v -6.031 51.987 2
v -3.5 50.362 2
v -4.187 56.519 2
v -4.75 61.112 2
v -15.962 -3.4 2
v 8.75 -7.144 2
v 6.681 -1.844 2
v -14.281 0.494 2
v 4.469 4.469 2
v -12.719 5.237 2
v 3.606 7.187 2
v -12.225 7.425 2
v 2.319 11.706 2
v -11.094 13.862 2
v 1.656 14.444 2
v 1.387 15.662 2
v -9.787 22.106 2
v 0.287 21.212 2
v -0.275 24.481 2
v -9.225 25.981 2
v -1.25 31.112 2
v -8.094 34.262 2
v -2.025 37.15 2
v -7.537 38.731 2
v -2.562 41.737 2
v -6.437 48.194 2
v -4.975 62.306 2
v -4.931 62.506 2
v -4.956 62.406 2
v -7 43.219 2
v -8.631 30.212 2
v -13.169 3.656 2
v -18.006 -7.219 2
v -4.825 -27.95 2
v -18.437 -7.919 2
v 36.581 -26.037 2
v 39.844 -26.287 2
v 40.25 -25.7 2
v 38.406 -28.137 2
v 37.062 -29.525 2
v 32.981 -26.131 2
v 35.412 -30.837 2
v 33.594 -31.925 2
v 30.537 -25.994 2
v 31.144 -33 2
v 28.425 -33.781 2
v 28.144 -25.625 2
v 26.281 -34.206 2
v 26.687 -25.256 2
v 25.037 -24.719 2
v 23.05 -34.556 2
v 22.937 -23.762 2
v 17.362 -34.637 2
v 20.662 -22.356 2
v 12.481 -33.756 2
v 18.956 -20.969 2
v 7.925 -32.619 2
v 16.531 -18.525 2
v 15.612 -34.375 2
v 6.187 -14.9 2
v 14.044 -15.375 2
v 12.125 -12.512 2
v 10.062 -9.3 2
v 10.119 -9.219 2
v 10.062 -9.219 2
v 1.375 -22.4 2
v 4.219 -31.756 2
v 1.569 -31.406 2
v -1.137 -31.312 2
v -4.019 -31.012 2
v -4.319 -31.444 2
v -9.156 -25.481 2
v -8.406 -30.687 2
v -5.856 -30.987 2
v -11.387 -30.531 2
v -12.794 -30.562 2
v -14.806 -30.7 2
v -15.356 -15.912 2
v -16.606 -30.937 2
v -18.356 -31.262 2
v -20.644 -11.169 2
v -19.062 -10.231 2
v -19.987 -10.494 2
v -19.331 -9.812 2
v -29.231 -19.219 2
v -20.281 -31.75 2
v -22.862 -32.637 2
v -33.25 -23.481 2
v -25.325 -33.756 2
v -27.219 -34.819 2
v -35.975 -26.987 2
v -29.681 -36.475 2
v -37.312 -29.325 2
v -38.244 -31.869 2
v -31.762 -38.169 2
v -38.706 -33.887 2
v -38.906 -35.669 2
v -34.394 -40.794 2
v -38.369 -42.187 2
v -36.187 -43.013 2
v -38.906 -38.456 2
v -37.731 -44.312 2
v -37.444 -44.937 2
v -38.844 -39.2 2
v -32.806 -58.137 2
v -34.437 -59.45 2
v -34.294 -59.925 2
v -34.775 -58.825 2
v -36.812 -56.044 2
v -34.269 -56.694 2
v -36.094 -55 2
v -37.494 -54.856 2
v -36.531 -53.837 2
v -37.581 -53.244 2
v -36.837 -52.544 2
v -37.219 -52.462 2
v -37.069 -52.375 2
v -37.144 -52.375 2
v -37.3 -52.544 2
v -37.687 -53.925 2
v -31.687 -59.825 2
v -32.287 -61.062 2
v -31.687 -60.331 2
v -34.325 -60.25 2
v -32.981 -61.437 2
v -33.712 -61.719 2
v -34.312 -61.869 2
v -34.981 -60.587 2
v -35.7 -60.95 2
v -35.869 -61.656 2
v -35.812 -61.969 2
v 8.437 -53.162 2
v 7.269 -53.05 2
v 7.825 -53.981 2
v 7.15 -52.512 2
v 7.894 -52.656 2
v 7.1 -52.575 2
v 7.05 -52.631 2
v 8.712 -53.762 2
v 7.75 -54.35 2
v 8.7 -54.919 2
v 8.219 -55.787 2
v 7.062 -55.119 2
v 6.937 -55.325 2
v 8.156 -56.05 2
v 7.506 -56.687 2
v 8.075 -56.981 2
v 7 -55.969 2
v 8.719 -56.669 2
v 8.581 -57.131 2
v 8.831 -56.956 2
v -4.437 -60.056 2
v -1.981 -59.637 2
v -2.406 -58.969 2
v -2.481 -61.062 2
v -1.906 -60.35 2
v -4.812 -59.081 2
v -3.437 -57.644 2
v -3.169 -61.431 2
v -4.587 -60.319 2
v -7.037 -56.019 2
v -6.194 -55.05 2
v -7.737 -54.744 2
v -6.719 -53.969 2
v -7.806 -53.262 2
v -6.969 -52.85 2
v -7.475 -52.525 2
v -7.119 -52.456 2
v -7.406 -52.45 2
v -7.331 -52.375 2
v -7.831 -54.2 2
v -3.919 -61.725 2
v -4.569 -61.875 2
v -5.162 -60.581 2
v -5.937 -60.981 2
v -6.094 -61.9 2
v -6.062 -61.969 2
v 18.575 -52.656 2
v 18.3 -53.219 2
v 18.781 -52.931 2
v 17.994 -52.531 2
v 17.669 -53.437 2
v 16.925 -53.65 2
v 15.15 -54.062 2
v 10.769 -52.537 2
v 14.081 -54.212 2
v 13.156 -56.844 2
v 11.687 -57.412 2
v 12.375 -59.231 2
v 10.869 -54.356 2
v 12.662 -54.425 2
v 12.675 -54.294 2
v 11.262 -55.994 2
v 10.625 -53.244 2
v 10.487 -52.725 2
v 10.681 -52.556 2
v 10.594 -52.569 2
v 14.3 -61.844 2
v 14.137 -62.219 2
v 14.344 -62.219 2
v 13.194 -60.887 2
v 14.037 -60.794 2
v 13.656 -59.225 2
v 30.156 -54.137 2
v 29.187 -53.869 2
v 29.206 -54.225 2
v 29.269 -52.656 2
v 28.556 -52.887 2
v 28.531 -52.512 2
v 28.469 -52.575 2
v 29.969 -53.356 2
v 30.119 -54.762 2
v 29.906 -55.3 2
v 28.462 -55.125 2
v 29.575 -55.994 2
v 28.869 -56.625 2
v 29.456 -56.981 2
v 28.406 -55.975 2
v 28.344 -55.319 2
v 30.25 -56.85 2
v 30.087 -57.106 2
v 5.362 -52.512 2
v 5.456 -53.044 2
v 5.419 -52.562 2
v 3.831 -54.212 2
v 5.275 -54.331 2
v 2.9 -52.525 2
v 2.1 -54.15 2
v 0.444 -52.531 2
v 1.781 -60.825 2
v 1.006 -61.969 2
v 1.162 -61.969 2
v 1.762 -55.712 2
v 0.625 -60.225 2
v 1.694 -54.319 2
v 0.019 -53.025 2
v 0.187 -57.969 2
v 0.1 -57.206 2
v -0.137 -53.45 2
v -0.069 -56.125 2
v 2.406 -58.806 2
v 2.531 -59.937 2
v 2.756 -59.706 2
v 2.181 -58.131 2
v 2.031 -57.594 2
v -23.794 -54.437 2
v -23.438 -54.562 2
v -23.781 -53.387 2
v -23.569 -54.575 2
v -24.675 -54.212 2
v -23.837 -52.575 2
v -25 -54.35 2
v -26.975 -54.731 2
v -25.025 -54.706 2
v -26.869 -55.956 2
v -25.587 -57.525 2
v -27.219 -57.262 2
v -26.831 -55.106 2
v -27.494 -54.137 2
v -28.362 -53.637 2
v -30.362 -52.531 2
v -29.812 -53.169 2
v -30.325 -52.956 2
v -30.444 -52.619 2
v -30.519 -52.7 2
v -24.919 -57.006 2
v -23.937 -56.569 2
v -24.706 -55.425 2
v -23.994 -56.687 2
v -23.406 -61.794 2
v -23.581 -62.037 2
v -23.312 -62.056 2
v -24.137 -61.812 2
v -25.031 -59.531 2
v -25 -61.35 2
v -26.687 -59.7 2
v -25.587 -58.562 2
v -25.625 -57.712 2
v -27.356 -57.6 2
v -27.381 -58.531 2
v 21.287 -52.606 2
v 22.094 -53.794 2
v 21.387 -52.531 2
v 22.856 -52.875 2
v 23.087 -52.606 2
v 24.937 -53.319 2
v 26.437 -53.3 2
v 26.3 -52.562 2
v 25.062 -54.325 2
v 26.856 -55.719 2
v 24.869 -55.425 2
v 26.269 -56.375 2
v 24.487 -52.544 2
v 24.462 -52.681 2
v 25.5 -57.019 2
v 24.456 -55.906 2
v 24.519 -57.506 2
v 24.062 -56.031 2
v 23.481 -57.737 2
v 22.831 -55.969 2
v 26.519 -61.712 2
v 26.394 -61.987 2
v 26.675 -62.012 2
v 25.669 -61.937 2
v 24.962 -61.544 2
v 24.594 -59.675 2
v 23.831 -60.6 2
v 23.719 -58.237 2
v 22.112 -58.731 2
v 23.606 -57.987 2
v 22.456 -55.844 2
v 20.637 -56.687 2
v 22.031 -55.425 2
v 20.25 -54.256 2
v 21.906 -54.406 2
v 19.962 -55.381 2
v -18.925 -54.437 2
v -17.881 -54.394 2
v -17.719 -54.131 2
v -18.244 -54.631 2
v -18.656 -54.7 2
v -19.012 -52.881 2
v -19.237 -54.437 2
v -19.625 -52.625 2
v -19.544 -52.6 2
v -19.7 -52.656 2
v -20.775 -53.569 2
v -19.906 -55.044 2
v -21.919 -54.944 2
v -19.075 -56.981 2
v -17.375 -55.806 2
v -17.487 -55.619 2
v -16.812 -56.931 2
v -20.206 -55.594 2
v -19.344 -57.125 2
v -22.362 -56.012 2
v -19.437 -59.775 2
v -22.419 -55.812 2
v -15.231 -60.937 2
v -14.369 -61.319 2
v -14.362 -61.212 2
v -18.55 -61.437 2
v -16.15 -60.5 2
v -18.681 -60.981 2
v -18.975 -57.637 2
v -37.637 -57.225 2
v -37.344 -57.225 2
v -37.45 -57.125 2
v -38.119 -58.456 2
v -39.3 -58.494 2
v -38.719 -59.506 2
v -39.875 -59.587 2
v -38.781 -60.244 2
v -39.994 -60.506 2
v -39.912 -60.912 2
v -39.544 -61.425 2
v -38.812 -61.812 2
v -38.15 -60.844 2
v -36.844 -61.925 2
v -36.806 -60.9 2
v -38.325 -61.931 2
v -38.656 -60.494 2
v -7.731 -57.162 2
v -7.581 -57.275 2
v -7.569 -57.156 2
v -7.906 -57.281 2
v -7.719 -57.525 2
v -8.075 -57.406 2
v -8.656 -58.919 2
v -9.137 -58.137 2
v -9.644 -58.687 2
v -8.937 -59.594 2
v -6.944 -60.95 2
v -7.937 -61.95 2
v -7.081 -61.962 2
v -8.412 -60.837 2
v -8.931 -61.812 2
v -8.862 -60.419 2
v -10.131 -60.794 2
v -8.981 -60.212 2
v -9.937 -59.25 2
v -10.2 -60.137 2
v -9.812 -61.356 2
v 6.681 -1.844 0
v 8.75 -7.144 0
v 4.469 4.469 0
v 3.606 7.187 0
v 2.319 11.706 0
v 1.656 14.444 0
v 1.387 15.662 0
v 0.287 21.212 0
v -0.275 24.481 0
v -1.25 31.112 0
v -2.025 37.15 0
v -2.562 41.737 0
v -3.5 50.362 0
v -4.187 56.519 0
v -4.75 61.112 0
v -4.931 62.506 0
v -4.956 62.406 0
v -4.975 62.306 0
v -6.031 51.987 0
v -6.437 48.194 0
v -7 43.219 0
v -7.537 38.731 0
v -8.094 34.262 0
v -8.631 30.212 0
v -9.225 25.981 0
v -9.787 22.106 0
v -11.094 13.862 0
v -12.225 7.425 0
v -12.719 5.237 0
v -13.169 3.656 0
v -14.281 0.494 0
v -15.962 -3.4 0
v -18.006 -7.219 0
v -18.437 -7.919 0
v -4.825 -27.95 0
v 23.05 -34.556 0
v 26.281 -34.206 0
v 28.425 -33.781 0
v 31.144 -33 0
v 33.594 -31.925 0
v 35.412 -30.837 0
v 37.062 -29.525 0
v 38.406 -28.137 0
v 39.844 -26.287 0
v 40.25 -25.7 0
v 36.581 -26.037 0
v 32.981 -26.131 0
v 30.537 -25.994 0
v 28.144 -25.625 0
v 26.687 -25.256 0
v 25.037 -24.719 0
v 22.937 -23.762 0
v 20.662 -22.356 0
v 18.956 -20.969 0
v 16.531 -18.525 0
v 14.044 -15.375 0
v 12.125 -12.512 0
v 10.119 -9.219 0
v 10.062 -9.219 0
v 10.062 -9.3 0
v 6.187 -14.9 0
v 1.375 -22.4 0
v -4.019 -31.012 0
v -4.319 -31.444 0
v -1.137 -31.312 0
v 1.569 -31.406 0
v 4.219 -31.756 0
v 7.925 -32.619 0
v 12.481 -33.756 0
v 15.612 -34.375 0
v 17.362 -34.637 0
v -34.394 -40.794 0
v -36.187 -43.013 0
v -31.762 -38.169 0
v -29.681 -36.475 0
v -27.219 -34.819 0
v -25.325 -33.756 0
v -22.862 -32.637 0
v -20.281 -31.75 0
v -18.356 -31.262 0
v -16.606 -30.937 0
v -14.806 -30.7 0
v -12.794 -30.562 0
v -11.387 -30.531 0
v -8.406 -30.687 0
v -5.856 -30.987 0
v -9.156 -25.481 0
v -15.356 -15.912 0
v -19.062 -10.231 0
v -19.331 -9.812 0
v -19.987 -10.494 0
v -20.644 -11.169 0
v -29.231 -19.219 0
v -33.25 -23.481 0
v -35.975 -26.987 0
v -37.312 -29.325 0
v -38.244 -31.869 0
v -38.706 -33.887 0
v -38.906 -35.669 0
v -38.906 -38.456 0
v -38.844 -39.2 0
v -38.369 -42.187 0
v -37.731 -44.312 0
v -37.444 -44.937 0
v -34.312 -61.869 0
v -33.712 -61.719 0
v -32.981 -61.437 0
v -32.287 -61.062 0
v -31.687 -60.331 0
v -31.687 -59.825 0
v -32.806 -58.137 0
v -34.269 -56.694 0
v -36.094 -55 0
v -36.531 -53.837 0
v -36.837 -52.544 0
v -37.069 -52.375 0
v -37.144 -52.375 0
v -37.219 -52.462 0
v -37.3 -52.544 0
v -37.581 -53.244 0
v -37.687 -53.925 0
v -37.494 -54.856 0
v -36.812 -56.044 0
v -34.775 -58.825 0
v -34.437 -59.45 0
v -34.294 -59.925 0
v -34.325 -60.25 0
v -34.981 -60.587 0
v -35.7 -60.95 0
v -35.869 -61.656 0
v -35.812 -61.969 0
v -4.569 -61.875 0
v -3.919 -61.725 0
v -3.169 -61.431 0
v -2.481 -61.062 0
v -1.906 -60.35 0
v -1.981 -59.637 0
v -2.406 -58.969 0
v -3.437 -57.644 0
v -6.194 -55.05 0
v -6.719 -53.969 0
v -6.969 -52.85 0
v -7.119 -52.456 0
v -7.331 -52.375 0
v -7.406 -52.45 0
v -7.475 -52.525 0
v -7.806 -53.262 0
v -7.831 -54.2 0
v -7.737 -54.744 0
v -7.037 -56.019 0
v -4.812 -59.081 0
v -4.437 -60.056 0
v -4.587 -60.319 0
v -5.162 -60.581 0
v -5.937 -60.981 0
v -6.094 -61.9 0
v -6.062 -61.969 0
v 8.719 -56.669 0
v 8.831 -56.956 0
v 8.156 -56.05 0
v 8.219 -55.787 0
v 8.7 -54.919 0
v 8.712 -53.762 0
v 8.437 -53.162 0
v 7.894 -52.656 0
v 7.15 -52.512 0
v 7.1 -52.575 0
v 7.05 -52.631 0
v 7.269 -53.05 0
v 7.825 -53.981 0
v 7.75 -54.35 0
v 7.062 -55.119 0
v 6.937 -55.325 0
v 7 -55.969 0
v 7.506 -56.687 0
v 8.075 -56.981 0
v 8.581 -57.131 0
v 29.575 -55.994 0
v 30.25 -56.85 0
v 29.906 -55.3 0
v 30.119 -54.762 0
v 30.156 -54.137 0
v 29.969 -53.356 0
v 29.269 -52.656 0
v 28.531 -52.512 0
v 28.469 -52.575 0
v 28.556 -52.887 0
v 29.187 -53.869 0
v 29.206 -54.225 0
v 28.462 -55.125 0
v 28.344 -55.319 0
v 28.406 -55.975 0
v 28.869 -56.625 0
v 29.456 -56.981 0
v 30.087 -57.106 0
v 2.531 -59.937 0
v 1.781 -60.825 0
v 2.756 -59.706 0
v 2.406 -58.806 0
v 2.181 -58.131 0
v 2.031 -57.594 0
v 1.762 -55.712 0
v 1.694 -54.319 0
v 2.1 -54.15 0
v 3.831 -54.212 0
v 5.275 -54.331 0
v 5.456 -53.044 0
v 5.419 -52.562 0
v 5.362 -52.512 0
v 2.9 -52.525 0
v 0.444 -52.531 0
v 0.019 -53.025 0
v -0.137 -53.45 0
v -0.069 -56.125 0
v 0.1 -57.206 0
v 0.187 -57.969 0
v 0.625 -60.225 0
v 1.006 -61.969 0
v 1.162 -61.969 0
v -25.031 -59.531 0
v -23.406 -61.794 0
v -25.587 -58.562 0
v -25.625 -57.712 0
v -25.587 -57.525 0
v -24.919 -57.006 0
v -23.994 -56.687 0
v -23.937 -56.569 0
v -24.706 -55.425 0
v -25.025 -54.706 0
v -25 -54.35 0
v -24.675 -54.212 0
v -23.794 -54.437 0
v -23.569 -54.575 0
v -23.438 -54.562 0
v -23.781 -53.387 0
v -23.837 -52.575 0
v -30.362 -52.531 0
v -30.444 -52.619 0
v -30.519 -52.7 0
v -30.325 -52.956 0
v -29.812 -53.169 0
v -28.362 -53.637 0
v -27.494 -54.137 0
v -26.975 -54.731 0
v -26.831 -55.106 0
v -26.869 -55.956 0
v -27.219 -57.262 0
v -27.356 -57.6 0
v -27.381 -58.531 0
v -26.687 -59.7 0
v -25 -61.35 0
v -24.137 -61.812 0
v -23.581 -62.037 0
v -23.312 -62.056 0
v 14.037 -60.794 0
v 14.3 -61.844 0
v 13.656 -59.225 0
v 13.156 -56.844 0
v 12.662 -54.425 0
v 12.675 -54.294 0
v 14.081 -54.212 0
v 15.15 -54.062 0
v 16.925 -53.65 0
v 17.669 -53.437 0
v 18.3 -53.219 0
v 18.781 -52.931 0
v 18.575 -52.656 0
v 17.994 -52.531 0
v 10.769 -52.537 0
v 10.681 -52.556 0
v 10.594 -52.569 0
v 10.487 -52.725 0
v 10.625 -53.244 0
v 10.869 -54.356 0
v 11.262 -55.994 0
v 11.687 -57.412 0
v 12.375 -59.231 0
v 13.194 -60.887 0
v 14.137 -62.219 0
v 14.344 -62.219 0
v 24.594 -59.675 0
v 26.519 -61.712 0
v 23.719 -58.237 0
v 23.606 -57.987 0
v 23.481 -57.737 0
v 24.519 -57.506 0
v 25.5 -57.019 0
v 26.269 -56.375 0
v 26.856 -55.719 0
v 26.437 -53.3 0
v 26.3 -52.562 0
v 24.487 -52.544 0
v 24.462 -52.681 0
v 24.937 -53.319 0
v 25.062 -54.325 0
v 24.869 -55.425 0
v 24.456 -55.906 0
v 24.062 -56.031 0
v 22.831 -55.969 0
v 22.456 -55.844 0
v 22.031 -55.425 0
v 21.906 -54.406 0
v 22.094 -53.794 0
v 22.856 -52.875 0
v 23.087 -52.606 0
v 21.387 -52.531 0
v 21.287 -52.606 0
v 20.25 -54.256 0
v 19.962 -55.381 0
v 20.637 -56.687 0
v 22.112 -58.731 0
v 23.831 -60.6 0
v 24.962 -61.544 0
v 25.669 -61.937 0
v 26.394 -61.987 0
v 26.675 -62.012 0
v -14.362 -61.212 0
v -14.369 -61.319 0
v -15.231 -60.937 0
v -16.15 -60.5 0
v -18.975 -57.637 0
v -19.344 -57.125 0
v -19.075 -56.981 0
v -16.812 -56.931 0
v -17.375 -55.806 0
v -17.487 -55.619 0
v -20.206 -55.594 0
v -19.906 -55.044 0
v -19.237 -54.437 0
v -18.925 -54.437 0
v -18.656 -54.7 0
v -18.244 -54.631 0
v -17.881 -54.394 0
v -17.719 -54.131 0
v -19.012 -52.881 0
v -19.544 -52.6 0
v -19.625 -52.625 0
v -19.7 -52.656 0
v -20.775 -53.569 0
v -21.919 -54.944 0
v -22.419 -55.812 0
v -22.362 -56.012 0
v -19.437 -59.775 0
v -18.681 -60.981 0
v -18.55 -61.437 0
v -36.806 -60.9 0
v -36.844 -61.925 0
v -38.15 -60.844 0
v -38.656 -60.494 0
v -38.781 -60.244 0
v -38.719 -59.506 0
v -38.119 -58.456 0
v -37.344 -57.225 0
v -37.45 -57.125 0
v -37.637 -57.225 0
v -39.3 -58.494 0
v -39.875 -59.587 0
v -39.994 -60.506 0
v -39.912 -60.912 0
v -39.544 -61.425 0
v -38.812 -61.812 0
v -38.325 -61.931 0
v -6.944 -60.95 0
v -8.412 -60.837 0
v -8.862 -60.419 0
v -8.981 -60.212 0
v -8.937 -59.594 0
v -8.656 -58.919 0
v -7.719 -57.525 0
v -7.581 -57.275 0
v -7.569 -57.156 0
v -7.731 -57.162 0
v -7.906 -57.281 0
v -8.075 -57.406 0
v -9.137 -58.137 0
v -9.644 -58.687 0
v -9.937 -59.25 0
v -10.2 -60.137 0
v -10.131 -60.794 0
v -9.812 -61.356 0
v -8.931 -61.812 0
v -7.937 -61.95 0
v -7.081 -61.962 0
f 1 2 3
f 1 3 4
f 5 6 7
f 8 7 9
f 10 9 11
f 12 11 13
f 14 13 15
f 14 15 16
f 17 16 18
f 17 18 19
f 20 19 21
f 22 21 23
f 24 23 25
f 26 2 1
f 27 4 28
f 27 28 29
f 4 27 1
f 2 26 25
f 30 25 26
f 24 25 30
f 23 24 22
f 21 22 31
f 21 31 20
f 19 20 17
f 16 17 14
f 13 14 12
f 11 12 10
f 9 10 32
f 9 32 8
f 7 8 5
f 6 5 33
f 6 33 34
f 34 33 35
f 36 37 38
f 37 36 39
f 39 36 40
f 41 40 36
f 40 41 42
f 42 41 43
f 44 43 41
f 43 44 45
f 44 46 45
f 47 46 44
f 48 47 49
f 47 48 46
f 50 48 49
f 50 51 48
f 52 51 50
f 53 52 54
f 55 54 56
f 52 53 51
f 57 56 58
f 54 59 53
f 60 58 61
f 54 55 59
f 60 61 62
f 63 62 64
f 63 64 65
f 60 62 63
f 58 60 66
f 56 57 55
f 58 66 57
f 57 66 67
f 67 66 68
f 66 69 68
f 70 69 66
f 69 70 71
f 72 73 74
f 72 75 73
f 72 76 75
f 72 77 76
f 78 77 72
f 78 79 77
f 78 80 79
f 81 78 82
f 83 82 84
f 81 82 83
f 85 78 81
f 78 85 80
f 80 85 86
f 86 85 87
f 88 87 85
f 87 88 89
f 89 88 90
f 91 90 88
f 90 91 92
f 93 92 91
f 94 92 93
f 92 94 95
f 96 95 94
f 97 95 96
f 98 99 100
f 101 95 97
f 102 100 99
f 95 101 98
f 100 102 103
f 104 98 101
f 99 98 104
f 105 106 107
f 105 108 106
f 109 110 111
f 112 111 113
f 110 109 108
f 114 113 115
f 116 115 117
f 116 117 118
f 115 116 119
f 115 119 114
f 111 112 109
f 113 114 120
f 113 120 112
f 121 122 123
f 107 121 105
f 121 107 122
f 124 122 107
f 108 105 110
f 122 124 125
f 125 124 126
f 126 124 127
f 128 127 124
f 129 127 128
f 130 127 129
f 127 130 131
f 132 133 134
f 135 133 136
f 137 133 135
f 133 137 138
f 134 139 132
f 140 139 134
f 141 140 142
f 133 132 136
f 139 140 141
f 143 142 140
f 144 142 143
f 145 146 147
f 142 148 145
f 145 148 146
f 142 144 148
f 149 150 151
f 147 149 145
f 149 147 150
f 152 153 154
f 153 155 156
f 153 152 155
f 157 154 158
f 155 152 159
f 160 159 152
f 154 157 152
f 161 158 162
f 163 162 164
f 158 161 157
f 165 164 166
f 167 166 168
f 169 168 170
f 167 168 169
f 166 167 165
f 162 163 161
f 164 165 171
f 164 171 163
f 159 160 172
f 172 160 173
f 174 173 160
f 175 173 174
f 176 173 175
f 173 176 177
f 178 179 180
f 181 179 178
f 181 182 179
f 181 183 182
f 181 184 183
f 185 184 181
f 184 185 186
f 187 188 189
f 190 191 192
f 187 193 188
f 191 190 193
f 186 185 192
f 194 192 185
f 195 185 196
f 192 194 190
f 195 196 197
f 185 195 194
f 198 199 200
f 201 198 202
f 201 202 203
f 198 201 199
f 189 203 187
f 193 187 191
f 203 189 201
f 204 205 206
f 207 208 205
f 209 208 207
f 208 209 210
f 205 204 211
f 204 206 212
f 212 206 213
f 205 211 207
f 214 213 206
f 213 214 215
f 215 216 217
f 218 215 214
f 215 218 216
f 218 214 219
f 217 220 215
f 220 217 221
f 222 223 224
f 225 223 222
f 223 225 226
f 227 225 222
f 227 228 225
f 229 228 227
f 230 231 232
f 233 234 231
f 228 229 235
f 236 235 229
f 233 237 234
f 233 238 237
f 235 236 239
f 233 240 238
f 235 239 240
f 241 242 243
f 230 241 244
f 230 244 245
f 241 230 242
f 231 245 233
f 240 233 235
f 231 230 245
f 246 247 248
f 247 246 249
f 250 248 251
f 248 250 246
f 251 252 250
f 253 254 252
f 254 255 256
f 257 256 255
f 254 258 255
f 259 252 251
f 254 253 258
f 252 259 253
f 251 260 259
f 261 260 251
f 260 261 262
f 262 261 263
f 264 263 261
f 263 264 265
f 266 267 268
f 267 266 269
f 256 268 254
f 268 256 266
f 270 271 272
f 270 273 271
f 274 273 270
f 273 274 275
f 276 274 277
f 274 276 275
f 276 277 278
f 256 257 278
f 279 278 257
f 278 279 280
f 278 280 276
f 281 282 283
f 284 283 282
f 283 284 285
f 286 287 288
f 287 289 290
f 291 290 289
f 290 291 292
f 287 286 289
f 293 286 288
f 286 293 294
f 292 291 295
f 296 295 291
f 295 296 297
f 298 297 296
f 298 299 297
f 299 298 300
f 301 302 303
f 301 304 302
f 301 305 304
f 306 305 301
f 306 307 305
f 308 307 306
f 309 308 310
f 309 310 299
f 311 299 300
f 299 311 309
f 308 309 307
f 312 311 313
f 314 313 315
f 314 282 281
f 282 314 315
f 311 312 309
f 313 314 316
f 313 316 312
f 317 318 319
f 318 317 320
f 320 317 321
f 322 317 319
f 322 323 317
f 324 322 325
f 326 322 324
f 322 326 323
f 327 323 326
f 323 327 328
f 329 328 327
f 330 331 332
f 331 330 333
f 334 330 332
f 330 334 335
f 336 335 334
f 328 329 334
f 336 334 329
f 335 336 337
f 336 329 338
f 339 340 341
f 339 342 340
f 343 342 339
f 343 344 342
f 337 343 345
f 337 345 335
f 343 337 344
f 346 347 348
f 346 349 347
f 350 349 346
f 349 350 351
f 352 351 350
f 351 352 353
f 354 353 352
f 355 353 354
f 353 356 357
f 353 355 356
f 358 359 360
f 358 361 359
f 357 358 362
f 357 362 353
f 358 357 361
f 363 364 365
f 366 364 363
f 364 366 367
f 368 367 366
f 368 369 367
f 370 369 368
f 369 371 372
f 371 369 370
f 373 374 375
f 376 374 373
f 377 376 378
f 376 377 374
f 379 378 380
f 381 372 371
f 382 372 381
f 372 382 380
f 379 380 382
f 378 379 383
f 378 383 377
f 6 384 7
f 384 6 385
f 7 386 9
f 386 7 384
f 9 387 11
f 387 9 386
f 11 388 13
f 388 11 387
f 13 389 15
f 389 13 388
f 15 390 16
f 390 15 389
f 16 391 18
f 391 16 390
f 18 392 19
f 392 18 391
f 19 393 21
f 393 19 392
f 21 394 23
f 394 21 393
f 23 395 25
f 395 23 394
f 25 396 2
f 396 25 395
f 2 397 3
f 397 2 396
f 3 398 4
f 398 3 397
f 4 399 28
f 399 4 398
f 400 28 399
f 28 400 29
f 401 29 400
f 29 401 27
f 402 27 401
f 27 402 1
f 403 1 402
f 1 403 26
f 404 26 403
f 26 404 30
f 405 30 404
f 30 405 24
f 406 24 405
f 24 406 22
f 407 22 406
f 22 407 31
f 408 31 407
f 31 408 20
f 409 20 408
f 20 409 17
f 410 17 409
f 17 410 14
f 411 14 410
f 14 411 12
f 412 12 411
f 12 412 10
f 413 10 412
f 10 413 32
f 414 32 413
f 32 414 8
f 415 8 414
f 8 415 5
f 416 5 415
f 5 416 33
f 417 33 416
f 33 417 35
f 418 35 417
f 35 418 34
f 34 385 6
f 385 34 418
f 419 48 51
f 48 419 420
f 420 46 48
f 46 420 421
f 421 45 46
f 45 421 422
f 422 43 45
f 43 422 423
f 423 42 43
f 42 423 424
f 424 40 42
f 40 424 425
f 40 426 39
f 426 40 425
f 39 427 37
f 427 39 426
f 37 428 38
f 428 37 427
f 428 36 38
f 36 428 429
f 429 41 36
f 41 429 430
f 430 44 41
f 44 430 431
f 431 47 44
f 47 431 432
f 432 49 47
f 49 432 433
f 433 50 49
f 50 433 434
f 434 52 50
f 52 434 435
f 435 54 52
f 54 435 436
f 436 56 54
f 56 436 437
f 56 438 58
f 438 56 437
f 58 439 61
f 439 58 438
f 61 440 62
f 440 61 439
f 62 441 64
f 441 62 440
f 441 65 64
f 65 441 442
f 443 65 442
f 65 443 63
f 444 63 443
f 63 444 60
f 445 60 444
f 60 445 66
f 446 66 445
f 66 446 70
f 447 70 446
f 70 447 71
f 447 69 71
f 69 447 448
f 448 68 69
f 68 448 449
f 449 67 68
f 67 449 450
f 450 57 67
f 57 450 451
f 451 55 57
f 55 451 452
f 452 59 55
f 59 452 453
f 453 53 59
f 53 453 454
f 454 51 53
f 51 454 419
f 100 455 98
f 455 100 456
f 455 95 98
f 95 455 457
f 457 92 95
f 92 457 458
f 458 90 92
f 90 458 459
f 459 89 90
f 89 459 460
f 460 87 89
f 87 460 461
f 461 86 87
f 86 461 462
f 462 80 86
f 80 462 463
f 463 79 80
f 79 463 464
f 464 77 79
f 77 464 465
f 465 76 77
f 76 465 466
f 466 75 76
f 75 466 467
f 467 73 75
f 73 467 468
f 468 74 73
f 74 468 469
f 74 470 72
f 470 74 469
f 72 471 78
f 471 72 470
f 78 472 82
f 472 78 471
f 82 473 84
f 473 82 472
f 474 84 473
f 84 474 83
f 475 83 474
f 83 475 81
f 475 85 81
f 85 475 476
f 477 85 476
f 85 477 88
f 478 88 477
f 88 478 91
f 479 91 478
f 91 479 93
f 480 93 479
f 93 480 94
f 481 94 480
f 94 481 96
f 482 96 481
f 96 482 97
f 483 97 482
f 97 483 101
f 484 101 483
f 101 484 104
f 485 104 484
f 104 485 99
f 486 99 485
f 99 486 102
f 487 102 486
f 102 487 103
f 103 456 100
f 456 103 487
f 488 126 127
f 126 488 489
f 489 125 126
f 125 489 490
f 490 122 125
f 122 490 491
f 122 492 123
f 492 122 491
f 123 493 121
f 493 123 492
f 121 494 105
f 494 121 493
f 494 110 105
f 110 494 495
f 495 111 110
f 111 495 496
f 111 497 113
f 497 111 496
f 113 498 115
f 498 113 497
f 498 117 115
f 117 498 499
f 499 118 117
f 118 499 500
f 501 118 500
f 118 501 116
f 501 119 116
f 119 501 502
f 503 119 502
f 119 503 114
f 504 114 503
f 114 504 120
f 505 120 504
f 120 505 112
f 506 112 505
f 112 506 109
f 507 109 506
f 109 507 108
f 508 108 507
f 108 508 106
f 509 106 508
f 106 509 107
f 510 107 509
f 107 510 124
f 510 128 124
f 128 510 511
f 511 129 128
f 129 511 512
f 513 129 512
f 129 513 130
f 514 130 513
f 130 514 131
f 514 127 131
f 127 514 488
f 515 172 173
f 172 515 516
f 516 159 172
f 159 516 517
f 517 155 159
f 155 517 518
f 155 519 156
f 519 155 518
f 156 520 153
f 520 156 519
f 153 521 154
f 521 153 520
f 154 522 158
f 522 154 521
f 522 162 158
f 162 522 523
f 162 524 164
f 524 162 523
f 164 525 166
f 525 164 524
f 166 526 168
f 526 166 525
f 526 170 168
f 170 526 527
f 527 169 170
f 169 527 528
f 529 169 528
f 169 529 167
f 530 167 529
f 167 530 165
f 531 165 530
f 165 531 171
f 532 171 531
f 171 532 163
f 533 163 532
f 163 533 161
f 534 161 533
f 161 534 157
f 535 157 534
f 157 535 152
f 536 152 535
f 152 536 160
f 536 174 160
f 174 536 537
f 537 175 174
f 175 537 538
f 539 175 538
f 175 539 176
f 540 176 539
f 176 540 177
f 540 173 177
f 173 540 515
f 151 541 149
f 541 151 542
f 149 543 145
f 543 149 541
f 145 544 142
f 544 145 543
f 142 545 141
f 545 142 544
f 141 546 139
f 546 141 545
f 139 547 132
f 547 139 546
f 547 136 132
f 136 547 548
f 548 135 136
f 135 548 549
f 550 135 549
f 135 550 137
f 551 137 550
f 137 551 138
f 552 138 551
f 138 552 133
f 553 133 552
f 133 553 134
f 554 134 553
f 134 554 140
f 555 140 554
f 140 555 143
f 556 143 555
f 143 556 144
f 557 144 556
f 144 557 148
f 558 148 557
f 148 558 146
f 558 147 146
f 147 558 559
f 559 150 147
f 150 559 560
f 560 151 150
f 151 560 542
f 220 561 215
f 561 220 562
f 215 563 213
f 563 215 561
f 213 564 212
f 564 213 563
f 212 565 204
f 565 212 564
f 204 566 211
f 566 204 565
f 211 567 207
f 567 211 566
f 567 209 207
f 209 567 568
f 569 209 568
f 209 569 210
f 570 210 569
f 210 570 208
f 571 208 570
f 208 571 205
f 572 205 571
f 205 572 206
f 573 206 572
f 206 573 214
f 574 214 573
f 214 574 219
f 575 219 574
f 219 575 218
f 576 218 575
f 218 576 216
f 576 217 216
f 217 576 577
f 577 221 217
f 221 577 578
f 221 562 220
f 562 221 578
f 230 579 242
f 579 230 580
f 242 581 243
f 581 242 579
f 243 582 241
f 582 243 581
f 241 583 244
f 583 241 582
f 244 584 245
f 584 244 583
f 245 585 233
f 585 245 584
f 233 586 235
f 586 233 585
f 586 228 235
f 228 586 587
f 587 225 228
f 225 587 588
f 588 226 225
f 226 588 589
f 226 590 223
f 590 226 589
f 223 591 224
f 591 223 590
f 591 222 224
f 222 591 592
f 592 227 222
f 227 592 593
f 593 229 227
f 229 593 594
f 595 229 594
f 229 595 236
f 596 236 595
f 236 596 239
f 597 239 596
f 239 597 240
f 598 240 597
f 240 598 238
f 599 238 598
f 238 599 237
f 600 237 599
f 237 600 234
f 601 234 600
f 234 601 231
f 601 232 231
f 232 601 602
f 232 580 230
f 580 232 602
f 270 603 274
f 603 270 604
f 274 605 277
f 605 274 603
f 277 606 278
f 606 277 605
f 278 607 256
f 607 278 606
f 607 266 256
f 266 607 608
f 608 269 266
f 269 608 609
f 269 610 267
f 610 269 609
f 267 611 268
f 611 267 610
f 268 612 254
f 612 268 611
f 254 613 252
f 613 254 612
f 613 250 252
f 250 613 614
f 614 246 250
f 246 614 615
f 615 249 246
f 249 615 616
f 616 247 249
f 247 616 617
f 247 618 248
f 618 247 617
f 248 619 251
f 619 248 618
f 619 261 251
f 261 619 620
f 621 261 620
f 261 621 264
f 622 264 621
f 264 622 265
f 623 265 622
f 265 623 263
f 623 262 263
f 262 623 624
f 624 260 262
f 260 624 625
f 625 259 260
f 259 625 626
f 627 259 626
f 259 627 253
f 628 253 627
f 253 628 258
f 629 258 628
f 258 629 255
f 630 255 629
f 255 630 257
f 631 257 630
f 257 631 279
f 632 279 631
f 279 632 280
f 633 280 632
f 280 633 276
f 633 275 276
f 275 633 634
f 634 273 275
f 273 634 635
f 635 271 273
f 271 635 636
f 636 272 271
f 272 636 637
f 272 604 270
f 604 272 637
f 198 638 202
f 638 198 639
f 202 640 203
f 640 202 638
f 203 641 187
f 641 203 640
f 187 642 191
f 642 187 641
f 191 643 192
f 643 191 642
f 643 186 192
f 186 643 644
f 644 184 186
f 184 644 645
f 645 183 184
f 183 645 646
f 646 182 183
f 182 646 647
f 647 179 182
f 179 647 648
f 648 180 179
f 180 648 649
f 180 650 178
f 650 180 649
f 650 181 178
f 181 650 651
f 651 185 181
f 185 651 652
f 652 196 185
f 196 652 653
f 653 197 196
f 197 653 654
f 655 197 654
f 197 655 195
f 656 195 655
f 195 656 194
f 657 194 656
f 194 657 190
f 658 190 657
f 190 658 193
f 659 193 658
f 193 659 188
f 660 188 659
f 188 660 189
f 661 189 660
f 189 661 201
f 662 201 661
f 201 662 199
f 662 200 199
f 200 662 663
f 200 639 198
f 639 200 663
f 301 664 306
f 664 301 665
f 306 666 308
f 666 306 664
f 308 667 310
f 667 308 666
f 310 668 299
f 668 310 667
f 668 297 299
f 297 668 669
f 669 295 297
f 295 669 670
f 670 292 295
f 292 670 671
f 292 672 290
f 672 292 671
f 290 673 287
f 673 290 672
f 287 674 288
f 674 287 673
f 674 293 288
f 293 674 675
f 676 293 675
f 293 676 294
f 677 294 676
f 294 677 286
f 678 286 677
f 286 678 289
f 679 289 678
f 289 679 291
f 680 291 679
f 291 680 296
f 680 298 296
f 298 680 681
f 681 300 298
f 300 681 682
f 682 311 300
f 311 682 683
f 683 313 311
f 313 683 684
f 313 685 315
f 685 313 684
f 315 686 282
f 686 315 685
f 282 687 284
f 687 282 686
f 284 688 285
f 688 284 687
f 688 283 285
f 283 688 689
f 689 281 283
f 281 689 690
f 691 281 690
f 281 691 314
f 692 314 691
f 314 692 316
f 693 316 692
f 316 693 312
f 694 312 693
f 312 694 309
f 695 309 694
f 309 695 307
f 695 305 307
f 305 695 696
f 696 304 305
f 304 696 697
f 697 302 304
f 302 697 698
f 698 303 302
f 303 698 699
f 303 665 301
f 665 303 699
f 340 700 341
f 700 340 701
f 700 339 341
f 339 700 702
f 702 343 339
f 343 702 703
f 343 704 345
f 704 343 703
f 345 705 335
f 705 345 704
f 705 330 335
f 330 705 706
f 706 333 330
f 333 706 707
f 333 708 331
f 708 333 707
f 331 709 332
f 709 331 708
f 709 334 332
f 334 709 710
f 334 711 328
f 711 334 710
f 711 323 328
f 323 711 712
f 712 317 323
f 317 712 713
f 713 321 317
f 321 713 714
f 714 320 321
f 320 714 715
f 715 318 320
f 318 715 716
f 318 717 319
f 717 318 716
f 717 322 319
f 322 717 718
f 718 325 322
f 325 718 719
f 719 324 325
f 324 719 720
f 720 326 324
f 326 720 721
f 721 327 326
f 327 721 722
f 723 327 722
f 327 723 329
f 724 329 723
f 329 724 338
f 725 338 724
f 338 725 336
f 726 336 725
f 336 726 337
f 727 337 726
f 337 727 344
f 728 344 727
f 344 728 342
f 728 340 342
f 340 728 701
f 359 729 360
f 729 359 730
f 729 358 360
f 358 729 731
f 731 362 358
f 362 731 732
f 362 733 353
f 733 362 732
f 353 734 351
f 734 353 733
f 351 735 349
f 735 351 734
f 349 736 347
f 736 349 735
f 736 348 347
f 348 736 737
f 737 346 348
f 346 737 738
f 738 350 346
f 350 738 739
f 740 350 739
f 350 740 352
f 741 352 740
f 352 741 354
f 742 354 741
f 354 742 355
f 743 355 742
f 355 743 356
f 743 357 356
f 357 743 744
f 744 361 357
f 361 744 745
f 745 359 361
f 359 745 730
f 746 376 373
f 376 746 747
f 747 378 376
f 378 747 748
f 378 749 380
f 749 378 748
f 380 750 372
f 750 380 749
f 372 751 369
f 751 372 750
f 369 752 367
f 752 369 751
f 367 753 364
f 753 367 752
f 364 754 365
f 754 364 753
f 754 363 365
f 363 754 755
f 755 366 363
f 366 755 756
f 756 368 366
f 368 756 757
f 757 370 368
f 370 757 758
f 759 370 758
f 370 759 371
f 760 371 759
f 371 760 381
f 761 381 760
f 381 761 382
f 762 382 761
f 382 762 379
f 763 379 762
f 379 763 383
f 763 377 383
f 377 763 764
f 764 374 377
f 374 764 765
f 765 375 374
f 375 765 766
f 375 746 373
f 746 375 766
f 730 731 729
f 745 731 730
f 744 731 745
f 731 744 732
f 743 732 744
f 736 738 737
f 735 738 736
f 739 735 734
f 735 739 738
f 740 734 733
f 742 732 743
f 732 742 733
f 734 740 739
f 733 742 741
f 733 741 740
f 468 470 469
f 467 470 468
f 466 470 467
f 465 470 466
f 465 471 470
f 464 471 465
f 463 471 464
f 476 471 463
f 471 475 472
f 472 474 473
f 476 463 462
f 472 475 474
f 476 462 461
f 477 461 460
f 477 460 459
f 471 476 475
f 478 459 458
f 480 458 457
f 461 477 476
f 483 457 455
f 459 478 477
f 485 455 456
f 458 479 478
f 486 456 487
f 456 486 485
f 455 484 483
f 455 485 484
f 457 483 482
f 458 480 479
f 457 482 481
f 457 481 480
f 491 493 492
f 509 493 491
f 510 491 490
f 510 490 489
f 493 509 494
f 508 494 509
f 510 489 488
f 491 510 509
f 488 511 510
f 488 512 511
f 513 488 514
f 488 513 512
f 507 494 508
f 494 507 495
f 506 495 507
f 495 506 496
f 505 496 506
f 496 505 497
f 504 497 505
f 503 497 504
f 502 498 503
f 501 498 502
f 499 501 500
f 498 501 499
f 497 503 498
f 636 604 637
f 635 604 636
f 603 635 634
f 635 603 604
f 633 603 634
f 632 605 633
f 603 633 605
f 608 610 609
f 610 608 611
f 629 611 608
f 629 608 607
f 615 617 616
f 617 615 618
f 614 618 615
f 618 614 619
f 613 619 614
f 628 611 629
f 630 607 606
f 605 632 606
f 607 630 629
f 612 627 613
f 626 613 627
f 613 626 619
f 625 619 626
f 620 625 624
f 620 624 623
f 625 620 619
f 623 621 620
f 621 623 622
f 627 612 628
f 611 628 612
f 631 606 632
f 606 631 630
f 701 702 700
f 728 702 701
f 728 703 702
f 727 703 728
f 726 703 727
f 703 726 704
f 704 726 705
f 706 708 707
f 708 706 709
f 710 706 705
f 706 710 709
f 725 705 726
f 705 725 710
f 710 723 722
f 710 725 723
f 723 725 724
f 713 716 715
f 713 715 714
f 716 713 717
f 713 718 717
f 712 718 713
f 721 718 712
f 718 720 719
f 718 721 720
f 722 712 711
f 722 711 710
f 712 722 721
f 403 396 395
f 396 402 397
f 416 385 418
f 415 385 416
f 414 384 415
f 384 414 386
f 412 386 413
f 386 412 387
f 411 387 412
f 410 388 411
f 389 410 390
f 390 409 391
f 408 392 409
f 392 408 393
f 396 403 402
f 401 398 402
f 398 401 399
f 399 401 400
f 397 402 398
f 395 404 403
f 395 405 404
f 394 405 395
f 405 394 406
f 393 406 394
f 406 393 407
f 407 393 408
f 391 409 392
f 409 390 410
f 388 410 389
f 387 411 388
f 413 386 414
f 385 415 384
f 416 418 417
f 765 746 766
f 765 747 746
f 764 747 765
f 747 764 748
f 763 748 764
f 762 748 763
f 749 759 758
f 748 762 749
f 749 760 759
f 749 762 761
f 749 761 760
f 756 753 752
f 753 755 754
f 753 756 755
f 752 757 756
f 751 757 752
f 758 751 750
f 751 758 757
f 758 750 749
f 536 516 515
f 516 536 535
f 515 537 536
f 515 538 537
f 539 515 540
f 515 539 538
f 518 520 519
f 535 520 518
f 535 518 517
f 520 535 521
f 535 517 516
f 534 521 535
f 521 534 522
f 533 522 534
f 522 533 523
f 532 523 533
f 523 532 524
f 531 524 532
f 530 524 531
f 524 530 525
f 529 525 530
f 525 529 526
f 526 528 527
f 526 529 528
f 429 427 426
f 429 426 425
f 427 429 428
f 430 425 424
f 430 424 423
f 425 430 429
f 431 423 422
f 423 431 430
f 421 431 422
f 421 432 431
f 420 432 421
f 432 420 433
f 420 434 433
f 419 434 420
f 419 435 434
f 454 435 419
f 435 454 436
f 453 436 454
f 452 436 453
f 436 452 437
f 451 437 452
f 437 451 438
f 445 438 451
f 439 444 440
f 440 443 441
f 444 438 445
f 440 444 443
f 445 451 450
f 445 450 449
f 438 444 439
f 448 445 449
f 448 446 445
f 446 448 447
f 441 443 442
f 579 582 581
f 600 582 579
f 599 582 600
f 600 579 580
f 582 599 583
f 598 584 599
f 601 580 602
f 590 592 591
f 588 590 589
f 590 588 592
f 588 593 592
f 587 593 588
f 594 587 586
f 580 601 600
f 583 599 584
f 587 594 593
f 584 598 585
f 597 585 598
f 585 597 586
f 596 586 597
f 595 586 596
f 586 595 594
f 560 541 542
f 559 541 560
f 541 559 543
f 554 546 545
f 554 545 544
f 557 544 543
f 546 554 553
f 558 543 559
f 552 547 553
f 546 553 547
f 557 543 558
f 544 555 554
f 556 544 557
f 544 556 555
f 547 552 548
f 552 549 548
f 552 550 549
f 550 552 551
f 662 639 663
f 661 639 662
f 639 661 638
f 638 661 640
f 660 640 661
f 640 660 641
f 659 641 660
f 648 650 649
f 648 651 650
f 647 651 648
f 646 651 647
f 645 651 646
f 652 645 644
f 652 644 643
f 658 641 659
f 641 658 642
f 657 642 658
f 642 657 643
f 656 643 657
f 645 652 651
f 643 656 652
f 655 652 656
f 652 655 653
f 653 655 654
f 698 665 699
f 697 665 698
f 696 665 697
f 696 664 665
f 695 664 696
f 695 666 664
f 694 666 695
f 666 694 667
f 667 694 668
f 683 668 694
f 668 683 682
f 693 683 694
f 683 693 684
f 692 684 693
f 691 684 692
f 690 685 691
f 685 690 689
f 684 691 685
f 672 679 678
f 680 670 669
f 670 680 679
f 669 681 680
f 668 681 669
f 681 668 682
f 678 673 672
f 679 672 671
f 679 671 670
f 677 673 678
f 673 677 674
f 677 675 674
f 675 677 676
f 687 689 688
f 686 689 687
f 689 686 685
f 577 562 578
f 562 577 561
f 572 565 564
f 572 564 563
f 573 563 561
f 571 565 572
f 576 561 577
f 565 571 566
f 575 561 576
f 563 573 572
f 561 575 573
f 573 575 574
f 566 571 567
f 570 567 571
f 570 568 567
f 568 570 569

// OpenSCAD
module 3d37fe6d607019b0f5bf06de773b44ef_1()
{
 /* Generated by trace2scad version 20150415
    http://aggregate.org/MAKE/TRACE2SCAD/
    Optimized model has 387/4796 original points
 */
 color([0.48, 0.48, 0.48])
 assign(minx=0) /* polygon minx=39 */
 assign(miny=0) /* polygon miny=45 */
 assign(maxx=12880) /* polygon maxx=12880 */
 assign(maxy=20000) /* polygon maxy=20001 */
 assign(dx=maxx-minx)
 assign(dy=maxy-miny)
 assign(maxd=((dx>dy)?dx:dy))
 scale([1/maxd, 1/maxd, 1])
 translate([-minx-dx/2, -miny-dy/2, 0])
 linear_extrude(height=1, convexity=387)
 union() {
  union() {
   polygon([[5647,19985],[5644,19969],[5475,18318],[5410,17711],[5320,16915],[5234,16197],[5145,15482],[5059,14834],[4964,14157],[4874,13537],[4665,12218],[4484,11188],[4405,10838],[4333,10585],[4155,10079],[3886,9456],[3559,8845],[3490,8733],[5668,5528],[7840,8857],[7509,9705],[7155,10715],[7017,11150],[6811,11873],[6705,12311],[6662,12506],[6486,13394],[6396,13917],[6240,14978],[6116,15944],[6030,16678],[5880,18058],[5770,19043],[5680,19778],[5651,20001]], convexity=6);
   polygon([[8050,8518],[8050,8512],[7430,7616],[6660,6416],[5797,5038],[5749,4969],[6258,4990],[6691,4975],[7115,4919],[7708,4781],[8437,4599],[8938,4500],[9218,4458],[10128,4471],[10645,4527],[10988,4595],[11423,4720],[11815,4892],[12106,5066],[12370,5276],[12585,5498],[12815,5794],[12880,5888],[12293,5834],[11717,5819],[11326,5841],[10943,5900],[10710,5959],[10446,6045],[10110,6198],[9746,6423],[9473,6645],[9085,7036],[8687,7540],[8380,7998],[8059,8525],[8050,8525]], convexity=9);
   polygon([[3242,8321],[3137,8213],[1763,6925],[1120,6243],[684,5682],[470,5308],[321,4901],[247,4578],[215,4293],[215,3847],[225,3728],[301,3250],[403,2910],[449,2810],[650,3118],[937,3473],[1358,3893],[1691,4164],[2085,4429],[2388,4599],[2782,4778],[3195,4920],[3503,4998],[3783,5050],[4071,5088],[4393,5110],[4618,5115],[5095,5090],[5503,5042],[4975,5923],[3983,7454],[3390,8363],[3347,8430]], convexity=7);
   polygon([[485,1606],[472,1593],[427,1481],[410,1372],[441,1223],[550,1033],[876,588],[930,488],[953,412],[948,360],[843,306],[728,248],[701,135],[710,85],[950,101],[1046,125],[1163,170],[1274,230],[1370,347],[1370,428],[1191,698],[957,929],[665,1200],[595,1386],[546,1593],[509,1620],[497,1620]], convexity=8);
   polygon([[5255,1608],[5244,1596],[5191,1478],[5187,1328],[5202,1241],[5314,1037],[5670,547],[5730,391],[5706,349],[5614,307],[5490,243],[5465,96],[5470,85],[5709,100],[5813,124],[5933,171],[6043,230],[6135,344],[6123,458],[6055,565],[5890,777],[5449,1192],[5365,1365],[5325,1544],[5301,1607],[5267,1620]], convexity=8);
   polygon([[6904,1596],[6511,1595],[6443,1516],[6418,1448],[6429,1020],[6456,847],[6470,725],[6540,364],[6601,85],[6626,85],[6725,268],[6845,410],[6881,447],[6825,591],[6789,699],[6765,785],[6722,1086],[6711,1309],[6776,1336],[7053,1326],[7284,1307],[7313,1513],[7307,1590],[7298,1598]], convexity=10);
   polygon([[7576,1588],[7568,1579],[7603,1512],[7692,1363],[7680,1304],[7570,1181],[7550,1148],[7560,1045],[7641,930],[7732,883],[7813,859],[7853,887],[7835,933],[7745,1032],[7755,1074],[7832,1213],[7834,1398],[7790,1494],[7703,1575],[7584,1598]], convexity=10);
   polygon([[11000,1593],[10995,1588],[11009,1538],[11110,1381],[11113,1324],[10994,1180],[10975,1149],[10985,1044],[11059,940],[11153,883],[11254,863],[11280,904],[11172,1041],[11225,1152],[11259,1238],[11265,1338],[11235,1463],[11123,1575],[11005,1598]], convexity=10);
   polygon([[1569,1581],[1557,1568],[1588,1527],[1670,1493],[1902,1418],[2041,1338],[2124,1243],[2147,1183],[2141,1047],[2085,838],[2063,784],[2059,635],[2170,448],[2440,184],[2578,110],[2667,74],[2710,71],[2695,113],[2435,475],[2346,630],[2340,766],[2346,796],[2453,879],[2601,930],[2610,949],[2487,1132],[2436,1247],[2440,1304],[2492,1326],[2633,1290],[2669,1268],[2690,1270],[2635,1458],[2626,1588],[1582,1595]], convexity=13);
   polygon([[8149,1591],[8135,1589],[8118,1564],[8140,1481],[8179,1303],[8242,1041],[8310,814],[8420,523],[8551,258],[8702,45],[8735,45],[8728,105],[8686,273],[8625,524],[8545,905],[8466,1292],[8468,1313],[8693,1326],[8864,1350],[9148,1416],[9267,1450],[9368,1485],[9445,1531],[9412,1575],[9319,1595],[8163,1594]], convexity=9);
   polygon([[9854,1589],[9846,1583],[9680,1319],[9634,1139],[9742,930],[9978,603],[10253,304],[10434,153],[10547,90],[10663,82],[10708,78],[10683,126],[10375,452],[10235,682],[10217,722],[10197,762],[10363,799],[10520,877],[10643,980],[10737,1085],[10670,1472],[10648,1590],[10358,1593],[10354,1571],[10430,1469],[10450,1308],[10419,1132],[10353,1055],[10290,1035],[10093,1045],[10033,1065],[9965,1132],[9945,1295],[9975,1393],[10097,1540],[10134,1583],[9862,1595]], convexity=13);
   polygon([[3300,1580],[3288,1575],[3116,1429],[2933,1209],[2853,1070],[2862,1038],[3330,436],[3451,243],[3472,170],[4141,189],[4142,206],[4003,250],[3856,320],[3404,778],[3345,860],[3388,883],[3750,891],[3660,1071],[3642,1101],[3207,1105],[3255,1193],[3362,1290],[3412,1290],[3455,1248],[3521,1259],[3579,1297],[3605,1339],[3398,1539],[3313,1584]], convexity=12);
   polygon([[433,852],[418,844],[152,641],[60,466],[41,319],[54,254],[113,172],[230,110],[308,91],[545,92],[551,256],[336,265],[255,321],[235,361],[245,479],[341,647],[465,844],[448,860]], convexity=8);
   polygon([[5175,835],[5148,815],[4978,698],[4897,610],[4850,520],[4808,378],[4819,273],[4870,183],[5011,110],[5170,88],[5307,86],[5329,248],[5094,266],[5022,333],[5003,366],[5010,465],[5055,573],[5205,796],[5227,836],[5229,855],[5203,854]], convexity=8);
  }
 }
}

module 3d37fe6d607019b0f5bf06de773b44ef()
{
 /* all layers combined, scaled to within a 1mm cube */
 scale([1, 1, 1/1])
 difference() {
  union() {
   scale([1,1,2]) translate([0,0,-0.5]) 3d37fe6d607019b0f5bf06de773b44ef_1();
  }
  translate([0,0,-2]) cube([2,2,4],center=true);
 }
}

scale([125, 125, 2]) {
	3d37fe6d607019b0f5bf06de773b44ef();
}
